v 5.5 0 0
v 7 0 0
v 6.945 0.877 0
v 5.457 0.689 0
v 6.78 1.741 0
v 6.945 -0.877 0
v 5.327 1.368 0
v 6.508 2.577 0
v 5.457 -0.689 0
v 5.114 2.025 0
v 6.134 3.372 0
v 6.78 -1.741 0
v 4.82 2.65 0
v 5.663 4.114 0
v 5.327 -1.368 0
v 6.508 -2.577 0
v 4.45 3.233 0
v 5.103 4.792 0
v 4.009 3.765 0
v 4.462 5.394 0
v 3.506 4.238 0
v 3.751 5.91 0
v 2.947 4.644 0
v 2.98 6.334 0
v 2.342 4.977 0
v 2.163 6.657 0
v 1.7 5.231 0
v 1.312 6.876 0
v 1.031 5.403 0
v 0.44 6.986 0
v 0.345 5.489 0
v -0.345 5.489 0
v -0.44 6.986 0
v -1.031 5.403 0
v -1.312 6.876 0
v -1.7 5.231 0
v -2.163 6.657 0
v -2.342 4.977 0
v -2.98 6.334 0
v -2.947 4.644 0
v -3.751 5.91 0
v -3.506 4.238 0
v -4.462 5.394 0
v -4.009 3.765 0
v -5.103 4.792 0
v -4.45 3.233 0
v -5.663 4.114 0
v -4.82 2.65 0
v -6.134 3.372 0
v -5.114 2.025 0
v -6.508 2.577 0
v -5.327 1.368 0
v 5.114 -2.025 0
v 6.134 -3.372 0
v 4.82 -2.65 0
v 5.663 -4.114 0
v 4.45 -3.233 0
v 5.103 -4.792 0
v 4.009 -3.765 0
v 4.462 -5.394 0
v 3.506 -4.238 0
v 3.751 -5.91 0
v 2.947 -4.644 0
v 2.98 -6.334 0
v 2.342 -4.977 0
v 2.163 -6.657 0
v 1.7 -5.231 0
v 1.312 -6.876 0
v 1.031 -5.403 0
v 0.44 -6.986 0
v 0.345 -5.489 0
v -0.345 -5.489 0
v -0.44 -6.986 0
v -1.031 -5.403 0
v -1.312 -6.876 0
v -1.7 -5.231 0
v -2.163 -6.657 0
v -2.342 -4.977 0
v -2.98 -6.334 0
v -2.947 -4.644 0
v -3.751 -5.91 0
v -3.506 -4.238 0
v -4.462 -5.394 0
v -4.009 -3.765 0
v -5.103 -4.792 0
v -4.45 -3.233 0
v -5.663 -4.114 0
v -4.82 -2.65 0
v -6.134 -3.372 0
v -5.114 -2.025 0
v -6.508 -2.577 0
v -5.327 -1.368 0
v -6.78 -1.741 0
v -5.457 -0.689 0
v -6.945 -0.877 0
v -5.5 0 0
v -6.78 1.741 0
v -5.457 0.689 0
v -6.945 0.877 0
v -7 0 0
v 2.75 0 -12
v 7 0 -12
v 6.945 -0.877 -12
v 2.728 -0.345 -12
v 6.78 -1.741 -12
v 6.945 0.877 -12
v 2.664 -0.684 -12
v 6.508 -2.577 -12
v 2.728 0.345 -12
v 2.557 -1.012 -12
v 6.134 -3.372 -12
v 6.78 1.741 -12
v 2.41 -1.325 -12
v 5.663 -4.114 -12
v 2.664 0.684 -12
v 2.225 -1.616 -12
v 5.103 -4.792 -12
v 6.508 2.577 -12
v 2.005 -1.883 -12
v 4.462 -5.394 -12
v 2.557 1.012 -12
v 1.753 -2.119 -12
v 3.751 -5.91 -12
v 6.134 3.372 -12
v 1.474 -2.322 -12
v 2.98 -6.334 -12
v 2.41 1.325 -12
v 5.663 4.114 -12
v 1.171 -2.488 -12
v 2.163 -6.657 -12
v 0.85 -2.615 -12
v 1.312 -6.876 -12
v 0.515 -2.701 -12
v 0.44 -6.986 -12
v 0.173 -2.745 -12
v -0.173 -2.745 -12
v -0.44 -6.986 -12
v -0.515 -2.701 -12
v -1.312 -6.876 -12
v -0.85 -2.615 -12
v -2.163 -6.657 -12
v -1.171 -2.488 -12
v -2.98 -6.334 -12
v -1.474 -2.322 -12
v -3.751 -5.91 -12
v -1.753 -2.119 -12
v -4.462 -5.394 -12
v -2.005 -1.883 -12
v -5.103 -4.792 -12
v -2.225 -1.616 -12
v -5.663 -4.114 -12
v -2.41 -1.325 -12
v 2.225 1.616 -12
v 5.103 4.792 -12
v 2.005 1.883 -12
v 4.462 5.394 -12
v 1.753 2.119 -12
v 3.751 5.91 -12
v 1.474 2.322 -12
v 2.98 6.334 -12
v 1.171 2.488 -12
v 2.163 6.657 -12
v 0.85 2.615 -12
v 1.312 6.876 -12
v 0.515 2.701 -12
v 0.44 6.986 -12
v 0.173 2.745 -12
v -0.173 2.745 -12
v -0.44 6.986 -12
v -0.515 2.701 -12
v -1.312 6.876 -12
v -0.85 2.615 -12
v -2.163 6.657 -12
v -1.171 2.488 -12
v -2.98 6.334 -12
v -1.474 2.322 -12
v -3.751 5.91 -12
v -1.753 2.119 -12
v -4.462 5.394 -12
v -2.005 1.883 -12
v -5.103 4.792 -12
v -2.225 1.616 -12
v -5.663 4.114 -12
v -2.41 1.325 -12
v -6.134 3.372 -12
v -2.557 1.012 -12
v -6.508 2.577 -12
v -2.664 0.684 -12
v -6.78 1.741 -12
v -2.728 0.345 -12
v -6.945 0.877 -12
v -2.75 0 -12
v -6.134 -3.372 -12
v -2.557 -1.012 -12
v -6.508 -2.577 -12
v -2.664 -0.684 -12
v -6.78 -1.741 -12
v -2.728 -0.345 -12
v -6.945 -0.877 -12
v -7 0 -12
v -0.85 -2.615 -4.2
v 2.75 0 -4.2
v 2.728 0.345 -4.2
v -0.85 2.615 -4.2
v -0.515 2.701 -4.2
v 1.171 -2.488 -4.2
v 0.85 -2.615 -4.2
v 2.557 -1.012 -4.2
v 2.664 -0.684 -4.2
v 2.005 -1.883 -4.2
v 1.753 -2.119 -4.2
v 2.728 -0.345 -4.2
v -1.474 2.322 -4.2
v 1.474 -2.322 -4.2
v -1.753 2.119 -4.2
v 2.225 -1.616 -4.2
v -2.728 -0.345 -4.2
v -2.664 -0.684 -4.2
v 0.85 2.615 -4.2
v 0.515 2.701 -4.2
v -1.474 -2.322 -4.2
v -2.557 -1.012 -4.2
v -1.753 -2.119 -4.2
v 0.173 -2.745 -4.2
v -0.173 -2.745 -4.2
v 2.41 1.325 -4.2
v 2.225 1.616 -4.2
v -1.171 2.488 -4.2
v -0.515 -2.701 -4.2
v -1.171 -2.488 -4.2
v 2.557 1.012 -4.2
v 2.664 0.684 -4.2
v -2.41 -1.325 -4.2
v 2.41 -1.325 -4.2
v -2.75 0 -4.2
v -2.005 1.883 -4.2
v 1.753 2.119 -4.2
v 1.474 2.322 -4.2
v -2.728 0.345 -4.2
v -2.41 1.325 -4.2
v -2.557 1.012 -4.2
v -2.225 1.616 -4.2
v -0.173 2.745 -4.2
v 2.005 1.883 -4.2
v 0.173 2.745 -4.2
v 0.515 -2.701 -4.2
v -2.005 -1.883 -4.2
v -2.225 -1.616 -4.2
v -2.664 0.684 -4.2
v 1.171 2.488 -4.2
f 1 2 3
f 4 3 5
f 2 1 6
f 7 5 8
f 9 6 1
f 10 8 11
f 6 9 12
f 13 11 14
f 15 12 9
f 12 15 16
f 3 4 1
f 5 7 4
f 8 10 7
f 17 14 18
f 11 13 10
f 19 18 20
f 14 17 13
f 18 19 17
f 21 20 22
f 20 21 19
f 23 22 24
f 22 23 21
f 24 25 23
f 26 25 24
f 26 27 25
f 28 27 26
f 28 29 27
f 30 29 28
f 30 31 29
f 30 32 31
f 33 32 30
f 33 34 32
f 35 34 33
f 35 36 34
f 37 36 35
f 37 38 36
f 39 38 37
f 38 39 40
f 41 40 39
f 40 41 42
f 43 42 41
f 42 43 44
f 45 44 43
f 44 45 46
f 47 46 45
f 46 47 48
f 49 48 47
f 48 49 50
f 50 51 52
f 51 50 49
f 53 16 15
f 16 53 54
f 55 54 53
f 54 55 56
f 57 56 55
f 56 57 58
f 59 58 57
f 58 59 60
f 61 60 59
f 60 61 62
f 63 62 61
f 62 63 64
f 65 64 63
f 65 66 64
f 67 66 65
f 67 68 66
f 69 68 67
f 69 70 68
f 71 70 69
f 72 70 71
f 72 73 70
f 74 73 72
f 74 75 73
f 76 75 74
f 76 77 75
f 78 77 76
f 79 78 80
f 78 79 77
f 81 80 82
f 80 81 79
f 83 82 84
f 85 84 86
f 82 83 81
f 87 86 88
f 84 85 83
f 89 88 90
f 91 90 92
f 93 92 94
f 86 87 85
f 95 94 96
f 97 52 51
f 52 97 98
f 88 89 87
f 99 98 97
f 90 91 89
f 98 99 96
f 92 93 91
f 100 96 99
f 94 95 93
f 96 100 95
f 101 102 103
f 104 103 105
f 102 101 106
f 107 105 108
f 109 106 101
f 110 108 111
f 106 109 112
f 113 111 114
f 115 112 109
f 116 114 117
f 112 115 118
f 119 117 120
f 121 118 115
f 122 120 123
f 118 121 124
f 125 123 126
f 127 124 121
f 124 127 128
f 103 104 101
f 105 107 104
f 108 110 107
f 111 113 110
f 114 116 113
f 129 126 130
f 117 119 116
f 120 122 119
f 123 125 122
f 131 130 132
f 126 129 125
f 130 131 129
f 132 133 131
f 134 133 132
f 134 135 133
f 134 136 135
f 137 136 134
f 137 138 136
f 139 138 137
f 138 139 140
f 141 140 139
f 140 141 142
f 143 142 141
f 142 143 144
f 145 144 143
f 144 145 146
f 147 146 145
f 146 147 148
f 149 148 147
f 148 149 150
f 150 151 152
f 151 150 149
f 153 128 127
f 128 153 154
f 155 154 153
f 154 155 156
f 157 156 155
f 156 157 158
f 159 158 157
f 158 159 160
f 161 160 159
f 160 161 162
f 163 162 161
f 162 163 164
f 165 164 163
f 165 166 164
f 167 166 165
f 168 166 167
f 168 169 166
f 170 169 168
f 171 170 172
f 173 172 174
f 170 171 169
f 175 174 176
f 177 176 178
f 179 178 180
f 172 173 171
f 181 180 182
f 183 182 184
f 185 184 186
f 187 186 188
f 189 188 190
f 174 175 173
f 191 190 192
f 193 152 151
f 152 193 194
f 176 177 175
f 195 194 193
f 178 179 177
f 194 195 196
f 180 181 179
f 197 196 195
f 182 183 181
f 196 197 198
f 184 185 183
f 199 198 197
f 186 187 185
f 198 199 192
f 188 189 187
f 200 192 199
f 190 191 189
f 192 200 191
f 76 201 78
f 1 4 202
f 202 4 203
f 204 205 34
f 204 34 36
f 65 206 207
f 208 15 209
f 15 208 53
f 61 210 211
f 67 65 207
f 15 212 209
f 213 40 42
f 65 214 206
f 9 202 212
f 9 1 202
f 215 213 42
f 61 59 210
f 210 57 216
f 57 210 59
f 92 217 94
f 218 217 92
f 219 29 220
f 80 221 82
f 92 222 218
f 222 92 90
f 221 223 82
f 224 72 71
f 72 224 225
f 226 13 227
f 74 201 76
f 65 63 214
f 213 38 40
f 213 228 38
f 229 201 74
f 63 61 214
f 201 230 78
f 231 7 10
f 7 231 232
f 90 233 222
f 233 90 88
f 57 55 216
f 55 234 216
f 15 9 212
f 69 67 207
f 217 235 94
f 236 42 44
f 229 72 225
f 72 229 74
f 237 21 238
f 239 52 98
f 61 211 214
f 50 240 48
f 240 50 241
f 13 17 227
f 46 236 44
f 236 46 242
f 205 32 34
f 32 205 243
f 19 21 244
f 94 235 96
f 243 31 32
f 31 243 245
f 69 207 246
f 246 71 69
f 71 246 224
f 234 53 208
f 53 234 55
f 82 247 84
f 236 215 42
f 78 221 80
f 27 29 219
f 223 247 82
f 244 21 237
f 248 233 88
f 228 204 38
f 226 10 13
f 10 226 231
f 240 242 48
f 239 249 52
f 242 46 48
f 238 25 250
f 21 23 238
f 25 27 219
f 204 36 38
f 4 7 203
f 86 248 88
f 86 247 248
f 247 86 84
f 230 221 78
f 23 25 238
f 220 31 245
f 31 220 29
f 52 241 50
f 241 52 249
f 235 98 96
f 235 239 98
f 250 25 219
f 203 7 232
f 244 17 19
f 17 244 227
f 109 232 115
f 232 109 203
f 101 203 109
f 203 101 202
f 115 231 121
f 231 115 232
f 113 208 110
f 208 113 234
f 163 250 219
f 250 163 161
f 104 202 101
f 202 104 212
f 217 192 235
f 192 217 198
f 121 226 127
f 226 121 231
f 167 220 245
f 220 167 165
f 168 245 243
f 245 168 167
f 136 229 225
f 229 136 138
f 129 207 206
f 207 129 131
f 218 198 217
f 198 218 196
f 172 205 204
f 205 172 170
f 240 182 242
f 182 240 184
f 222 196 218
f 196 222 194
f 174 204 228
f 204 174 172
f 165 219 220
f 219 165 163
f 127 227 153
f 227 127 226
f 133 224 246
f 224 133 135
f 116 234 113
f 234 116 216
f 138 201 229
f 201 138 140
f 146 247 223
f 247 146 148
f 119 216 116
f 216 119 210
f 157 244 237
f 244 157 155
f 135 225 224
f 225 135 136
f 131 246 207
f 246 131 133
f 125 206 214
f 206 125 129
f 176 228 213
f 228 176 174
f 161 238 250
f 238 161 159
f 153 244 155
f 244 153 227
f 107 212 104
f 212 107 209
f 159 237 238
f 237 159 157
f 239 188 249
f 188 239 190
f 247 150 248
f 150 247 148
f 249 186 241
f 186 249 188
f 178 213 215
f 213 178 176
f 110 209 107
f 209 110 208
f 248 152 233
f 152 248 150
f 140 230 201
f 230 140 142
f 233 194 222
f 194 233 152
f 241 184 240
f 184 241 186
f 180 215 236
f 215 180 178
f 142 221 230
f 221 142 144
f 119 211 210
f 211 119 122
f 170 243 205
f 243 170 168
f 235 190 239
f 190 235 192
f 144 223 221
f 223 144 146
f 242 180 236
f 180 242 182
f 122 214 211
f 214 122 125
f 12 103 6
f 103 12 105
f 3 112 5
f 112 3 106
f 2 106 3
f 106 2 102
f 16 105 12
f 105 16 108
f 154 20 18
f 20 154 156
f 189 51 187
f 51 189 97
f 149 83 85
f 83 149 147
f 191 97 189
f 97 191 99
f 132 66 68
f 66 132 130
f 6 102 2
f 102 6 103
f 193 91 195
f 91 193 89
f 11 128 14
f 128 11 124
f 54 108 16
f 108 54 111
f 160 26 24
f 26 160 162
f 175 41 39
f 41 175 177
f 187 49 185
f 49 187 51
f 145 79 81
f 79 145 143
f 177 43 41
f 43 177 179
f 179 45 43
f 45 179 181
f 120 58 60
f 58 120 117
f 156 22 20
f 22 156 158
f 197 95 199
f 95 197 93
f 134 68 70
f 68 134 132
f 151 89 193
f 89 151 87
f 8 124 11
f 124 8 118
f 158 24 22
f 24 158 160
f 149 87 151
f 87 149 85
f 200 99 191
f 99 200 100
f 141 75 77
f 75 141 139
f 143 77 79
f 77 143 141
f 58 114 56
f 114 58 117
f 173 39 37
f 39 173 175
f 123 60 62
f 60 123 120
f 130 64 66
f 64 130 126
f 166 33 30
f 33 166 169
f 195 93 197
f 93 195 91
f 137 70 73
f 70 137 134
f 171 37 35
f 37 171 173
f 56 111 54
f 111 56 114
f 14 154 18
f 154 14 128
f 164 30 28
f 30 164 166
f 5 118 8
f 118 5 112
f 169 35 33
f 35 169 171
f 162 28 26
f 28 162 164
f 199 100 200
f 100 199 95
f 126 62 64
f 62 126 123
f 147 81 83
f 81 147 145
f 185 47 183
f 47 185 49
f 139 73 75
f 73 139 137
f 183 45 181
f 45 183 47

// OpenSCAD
$fn = 50;


difference() {
	union() {
		translate(v = [0, 0, -12.0000000000]) {
			cylinder(h = 12, r = 7.0000000000);
		}
		cylinder(h = 0, r = 16.0000000000);
	}
	union() {
		translate(v = [0, 0, 0]) {
			rotate(a = [0, 0, 0]) {
				difference() {
					union() {
						#translate(v = [0, 0, -12.0000000000]) {
							cylinder(h = 12, r = 2.2500000000);
						}
						#translate(v = [0, 0, -4.2000000000]) {
							cylinder(h = 4.2000000000, r = 7.0000000000, r1 = 2.7500000000, r2 = 5.5000000000);
						}
						#translate(v = [0, 0, -12.0000000000]) {
							cylinder(h = 12, r = 2.7500000000);
						}
						#translate(v = [0, 0, -12.0000000000]) {
							cylinder(h = 12, r = 2.2500000000);
						}
					}
					union();
				}
			}
		}
	}
}
